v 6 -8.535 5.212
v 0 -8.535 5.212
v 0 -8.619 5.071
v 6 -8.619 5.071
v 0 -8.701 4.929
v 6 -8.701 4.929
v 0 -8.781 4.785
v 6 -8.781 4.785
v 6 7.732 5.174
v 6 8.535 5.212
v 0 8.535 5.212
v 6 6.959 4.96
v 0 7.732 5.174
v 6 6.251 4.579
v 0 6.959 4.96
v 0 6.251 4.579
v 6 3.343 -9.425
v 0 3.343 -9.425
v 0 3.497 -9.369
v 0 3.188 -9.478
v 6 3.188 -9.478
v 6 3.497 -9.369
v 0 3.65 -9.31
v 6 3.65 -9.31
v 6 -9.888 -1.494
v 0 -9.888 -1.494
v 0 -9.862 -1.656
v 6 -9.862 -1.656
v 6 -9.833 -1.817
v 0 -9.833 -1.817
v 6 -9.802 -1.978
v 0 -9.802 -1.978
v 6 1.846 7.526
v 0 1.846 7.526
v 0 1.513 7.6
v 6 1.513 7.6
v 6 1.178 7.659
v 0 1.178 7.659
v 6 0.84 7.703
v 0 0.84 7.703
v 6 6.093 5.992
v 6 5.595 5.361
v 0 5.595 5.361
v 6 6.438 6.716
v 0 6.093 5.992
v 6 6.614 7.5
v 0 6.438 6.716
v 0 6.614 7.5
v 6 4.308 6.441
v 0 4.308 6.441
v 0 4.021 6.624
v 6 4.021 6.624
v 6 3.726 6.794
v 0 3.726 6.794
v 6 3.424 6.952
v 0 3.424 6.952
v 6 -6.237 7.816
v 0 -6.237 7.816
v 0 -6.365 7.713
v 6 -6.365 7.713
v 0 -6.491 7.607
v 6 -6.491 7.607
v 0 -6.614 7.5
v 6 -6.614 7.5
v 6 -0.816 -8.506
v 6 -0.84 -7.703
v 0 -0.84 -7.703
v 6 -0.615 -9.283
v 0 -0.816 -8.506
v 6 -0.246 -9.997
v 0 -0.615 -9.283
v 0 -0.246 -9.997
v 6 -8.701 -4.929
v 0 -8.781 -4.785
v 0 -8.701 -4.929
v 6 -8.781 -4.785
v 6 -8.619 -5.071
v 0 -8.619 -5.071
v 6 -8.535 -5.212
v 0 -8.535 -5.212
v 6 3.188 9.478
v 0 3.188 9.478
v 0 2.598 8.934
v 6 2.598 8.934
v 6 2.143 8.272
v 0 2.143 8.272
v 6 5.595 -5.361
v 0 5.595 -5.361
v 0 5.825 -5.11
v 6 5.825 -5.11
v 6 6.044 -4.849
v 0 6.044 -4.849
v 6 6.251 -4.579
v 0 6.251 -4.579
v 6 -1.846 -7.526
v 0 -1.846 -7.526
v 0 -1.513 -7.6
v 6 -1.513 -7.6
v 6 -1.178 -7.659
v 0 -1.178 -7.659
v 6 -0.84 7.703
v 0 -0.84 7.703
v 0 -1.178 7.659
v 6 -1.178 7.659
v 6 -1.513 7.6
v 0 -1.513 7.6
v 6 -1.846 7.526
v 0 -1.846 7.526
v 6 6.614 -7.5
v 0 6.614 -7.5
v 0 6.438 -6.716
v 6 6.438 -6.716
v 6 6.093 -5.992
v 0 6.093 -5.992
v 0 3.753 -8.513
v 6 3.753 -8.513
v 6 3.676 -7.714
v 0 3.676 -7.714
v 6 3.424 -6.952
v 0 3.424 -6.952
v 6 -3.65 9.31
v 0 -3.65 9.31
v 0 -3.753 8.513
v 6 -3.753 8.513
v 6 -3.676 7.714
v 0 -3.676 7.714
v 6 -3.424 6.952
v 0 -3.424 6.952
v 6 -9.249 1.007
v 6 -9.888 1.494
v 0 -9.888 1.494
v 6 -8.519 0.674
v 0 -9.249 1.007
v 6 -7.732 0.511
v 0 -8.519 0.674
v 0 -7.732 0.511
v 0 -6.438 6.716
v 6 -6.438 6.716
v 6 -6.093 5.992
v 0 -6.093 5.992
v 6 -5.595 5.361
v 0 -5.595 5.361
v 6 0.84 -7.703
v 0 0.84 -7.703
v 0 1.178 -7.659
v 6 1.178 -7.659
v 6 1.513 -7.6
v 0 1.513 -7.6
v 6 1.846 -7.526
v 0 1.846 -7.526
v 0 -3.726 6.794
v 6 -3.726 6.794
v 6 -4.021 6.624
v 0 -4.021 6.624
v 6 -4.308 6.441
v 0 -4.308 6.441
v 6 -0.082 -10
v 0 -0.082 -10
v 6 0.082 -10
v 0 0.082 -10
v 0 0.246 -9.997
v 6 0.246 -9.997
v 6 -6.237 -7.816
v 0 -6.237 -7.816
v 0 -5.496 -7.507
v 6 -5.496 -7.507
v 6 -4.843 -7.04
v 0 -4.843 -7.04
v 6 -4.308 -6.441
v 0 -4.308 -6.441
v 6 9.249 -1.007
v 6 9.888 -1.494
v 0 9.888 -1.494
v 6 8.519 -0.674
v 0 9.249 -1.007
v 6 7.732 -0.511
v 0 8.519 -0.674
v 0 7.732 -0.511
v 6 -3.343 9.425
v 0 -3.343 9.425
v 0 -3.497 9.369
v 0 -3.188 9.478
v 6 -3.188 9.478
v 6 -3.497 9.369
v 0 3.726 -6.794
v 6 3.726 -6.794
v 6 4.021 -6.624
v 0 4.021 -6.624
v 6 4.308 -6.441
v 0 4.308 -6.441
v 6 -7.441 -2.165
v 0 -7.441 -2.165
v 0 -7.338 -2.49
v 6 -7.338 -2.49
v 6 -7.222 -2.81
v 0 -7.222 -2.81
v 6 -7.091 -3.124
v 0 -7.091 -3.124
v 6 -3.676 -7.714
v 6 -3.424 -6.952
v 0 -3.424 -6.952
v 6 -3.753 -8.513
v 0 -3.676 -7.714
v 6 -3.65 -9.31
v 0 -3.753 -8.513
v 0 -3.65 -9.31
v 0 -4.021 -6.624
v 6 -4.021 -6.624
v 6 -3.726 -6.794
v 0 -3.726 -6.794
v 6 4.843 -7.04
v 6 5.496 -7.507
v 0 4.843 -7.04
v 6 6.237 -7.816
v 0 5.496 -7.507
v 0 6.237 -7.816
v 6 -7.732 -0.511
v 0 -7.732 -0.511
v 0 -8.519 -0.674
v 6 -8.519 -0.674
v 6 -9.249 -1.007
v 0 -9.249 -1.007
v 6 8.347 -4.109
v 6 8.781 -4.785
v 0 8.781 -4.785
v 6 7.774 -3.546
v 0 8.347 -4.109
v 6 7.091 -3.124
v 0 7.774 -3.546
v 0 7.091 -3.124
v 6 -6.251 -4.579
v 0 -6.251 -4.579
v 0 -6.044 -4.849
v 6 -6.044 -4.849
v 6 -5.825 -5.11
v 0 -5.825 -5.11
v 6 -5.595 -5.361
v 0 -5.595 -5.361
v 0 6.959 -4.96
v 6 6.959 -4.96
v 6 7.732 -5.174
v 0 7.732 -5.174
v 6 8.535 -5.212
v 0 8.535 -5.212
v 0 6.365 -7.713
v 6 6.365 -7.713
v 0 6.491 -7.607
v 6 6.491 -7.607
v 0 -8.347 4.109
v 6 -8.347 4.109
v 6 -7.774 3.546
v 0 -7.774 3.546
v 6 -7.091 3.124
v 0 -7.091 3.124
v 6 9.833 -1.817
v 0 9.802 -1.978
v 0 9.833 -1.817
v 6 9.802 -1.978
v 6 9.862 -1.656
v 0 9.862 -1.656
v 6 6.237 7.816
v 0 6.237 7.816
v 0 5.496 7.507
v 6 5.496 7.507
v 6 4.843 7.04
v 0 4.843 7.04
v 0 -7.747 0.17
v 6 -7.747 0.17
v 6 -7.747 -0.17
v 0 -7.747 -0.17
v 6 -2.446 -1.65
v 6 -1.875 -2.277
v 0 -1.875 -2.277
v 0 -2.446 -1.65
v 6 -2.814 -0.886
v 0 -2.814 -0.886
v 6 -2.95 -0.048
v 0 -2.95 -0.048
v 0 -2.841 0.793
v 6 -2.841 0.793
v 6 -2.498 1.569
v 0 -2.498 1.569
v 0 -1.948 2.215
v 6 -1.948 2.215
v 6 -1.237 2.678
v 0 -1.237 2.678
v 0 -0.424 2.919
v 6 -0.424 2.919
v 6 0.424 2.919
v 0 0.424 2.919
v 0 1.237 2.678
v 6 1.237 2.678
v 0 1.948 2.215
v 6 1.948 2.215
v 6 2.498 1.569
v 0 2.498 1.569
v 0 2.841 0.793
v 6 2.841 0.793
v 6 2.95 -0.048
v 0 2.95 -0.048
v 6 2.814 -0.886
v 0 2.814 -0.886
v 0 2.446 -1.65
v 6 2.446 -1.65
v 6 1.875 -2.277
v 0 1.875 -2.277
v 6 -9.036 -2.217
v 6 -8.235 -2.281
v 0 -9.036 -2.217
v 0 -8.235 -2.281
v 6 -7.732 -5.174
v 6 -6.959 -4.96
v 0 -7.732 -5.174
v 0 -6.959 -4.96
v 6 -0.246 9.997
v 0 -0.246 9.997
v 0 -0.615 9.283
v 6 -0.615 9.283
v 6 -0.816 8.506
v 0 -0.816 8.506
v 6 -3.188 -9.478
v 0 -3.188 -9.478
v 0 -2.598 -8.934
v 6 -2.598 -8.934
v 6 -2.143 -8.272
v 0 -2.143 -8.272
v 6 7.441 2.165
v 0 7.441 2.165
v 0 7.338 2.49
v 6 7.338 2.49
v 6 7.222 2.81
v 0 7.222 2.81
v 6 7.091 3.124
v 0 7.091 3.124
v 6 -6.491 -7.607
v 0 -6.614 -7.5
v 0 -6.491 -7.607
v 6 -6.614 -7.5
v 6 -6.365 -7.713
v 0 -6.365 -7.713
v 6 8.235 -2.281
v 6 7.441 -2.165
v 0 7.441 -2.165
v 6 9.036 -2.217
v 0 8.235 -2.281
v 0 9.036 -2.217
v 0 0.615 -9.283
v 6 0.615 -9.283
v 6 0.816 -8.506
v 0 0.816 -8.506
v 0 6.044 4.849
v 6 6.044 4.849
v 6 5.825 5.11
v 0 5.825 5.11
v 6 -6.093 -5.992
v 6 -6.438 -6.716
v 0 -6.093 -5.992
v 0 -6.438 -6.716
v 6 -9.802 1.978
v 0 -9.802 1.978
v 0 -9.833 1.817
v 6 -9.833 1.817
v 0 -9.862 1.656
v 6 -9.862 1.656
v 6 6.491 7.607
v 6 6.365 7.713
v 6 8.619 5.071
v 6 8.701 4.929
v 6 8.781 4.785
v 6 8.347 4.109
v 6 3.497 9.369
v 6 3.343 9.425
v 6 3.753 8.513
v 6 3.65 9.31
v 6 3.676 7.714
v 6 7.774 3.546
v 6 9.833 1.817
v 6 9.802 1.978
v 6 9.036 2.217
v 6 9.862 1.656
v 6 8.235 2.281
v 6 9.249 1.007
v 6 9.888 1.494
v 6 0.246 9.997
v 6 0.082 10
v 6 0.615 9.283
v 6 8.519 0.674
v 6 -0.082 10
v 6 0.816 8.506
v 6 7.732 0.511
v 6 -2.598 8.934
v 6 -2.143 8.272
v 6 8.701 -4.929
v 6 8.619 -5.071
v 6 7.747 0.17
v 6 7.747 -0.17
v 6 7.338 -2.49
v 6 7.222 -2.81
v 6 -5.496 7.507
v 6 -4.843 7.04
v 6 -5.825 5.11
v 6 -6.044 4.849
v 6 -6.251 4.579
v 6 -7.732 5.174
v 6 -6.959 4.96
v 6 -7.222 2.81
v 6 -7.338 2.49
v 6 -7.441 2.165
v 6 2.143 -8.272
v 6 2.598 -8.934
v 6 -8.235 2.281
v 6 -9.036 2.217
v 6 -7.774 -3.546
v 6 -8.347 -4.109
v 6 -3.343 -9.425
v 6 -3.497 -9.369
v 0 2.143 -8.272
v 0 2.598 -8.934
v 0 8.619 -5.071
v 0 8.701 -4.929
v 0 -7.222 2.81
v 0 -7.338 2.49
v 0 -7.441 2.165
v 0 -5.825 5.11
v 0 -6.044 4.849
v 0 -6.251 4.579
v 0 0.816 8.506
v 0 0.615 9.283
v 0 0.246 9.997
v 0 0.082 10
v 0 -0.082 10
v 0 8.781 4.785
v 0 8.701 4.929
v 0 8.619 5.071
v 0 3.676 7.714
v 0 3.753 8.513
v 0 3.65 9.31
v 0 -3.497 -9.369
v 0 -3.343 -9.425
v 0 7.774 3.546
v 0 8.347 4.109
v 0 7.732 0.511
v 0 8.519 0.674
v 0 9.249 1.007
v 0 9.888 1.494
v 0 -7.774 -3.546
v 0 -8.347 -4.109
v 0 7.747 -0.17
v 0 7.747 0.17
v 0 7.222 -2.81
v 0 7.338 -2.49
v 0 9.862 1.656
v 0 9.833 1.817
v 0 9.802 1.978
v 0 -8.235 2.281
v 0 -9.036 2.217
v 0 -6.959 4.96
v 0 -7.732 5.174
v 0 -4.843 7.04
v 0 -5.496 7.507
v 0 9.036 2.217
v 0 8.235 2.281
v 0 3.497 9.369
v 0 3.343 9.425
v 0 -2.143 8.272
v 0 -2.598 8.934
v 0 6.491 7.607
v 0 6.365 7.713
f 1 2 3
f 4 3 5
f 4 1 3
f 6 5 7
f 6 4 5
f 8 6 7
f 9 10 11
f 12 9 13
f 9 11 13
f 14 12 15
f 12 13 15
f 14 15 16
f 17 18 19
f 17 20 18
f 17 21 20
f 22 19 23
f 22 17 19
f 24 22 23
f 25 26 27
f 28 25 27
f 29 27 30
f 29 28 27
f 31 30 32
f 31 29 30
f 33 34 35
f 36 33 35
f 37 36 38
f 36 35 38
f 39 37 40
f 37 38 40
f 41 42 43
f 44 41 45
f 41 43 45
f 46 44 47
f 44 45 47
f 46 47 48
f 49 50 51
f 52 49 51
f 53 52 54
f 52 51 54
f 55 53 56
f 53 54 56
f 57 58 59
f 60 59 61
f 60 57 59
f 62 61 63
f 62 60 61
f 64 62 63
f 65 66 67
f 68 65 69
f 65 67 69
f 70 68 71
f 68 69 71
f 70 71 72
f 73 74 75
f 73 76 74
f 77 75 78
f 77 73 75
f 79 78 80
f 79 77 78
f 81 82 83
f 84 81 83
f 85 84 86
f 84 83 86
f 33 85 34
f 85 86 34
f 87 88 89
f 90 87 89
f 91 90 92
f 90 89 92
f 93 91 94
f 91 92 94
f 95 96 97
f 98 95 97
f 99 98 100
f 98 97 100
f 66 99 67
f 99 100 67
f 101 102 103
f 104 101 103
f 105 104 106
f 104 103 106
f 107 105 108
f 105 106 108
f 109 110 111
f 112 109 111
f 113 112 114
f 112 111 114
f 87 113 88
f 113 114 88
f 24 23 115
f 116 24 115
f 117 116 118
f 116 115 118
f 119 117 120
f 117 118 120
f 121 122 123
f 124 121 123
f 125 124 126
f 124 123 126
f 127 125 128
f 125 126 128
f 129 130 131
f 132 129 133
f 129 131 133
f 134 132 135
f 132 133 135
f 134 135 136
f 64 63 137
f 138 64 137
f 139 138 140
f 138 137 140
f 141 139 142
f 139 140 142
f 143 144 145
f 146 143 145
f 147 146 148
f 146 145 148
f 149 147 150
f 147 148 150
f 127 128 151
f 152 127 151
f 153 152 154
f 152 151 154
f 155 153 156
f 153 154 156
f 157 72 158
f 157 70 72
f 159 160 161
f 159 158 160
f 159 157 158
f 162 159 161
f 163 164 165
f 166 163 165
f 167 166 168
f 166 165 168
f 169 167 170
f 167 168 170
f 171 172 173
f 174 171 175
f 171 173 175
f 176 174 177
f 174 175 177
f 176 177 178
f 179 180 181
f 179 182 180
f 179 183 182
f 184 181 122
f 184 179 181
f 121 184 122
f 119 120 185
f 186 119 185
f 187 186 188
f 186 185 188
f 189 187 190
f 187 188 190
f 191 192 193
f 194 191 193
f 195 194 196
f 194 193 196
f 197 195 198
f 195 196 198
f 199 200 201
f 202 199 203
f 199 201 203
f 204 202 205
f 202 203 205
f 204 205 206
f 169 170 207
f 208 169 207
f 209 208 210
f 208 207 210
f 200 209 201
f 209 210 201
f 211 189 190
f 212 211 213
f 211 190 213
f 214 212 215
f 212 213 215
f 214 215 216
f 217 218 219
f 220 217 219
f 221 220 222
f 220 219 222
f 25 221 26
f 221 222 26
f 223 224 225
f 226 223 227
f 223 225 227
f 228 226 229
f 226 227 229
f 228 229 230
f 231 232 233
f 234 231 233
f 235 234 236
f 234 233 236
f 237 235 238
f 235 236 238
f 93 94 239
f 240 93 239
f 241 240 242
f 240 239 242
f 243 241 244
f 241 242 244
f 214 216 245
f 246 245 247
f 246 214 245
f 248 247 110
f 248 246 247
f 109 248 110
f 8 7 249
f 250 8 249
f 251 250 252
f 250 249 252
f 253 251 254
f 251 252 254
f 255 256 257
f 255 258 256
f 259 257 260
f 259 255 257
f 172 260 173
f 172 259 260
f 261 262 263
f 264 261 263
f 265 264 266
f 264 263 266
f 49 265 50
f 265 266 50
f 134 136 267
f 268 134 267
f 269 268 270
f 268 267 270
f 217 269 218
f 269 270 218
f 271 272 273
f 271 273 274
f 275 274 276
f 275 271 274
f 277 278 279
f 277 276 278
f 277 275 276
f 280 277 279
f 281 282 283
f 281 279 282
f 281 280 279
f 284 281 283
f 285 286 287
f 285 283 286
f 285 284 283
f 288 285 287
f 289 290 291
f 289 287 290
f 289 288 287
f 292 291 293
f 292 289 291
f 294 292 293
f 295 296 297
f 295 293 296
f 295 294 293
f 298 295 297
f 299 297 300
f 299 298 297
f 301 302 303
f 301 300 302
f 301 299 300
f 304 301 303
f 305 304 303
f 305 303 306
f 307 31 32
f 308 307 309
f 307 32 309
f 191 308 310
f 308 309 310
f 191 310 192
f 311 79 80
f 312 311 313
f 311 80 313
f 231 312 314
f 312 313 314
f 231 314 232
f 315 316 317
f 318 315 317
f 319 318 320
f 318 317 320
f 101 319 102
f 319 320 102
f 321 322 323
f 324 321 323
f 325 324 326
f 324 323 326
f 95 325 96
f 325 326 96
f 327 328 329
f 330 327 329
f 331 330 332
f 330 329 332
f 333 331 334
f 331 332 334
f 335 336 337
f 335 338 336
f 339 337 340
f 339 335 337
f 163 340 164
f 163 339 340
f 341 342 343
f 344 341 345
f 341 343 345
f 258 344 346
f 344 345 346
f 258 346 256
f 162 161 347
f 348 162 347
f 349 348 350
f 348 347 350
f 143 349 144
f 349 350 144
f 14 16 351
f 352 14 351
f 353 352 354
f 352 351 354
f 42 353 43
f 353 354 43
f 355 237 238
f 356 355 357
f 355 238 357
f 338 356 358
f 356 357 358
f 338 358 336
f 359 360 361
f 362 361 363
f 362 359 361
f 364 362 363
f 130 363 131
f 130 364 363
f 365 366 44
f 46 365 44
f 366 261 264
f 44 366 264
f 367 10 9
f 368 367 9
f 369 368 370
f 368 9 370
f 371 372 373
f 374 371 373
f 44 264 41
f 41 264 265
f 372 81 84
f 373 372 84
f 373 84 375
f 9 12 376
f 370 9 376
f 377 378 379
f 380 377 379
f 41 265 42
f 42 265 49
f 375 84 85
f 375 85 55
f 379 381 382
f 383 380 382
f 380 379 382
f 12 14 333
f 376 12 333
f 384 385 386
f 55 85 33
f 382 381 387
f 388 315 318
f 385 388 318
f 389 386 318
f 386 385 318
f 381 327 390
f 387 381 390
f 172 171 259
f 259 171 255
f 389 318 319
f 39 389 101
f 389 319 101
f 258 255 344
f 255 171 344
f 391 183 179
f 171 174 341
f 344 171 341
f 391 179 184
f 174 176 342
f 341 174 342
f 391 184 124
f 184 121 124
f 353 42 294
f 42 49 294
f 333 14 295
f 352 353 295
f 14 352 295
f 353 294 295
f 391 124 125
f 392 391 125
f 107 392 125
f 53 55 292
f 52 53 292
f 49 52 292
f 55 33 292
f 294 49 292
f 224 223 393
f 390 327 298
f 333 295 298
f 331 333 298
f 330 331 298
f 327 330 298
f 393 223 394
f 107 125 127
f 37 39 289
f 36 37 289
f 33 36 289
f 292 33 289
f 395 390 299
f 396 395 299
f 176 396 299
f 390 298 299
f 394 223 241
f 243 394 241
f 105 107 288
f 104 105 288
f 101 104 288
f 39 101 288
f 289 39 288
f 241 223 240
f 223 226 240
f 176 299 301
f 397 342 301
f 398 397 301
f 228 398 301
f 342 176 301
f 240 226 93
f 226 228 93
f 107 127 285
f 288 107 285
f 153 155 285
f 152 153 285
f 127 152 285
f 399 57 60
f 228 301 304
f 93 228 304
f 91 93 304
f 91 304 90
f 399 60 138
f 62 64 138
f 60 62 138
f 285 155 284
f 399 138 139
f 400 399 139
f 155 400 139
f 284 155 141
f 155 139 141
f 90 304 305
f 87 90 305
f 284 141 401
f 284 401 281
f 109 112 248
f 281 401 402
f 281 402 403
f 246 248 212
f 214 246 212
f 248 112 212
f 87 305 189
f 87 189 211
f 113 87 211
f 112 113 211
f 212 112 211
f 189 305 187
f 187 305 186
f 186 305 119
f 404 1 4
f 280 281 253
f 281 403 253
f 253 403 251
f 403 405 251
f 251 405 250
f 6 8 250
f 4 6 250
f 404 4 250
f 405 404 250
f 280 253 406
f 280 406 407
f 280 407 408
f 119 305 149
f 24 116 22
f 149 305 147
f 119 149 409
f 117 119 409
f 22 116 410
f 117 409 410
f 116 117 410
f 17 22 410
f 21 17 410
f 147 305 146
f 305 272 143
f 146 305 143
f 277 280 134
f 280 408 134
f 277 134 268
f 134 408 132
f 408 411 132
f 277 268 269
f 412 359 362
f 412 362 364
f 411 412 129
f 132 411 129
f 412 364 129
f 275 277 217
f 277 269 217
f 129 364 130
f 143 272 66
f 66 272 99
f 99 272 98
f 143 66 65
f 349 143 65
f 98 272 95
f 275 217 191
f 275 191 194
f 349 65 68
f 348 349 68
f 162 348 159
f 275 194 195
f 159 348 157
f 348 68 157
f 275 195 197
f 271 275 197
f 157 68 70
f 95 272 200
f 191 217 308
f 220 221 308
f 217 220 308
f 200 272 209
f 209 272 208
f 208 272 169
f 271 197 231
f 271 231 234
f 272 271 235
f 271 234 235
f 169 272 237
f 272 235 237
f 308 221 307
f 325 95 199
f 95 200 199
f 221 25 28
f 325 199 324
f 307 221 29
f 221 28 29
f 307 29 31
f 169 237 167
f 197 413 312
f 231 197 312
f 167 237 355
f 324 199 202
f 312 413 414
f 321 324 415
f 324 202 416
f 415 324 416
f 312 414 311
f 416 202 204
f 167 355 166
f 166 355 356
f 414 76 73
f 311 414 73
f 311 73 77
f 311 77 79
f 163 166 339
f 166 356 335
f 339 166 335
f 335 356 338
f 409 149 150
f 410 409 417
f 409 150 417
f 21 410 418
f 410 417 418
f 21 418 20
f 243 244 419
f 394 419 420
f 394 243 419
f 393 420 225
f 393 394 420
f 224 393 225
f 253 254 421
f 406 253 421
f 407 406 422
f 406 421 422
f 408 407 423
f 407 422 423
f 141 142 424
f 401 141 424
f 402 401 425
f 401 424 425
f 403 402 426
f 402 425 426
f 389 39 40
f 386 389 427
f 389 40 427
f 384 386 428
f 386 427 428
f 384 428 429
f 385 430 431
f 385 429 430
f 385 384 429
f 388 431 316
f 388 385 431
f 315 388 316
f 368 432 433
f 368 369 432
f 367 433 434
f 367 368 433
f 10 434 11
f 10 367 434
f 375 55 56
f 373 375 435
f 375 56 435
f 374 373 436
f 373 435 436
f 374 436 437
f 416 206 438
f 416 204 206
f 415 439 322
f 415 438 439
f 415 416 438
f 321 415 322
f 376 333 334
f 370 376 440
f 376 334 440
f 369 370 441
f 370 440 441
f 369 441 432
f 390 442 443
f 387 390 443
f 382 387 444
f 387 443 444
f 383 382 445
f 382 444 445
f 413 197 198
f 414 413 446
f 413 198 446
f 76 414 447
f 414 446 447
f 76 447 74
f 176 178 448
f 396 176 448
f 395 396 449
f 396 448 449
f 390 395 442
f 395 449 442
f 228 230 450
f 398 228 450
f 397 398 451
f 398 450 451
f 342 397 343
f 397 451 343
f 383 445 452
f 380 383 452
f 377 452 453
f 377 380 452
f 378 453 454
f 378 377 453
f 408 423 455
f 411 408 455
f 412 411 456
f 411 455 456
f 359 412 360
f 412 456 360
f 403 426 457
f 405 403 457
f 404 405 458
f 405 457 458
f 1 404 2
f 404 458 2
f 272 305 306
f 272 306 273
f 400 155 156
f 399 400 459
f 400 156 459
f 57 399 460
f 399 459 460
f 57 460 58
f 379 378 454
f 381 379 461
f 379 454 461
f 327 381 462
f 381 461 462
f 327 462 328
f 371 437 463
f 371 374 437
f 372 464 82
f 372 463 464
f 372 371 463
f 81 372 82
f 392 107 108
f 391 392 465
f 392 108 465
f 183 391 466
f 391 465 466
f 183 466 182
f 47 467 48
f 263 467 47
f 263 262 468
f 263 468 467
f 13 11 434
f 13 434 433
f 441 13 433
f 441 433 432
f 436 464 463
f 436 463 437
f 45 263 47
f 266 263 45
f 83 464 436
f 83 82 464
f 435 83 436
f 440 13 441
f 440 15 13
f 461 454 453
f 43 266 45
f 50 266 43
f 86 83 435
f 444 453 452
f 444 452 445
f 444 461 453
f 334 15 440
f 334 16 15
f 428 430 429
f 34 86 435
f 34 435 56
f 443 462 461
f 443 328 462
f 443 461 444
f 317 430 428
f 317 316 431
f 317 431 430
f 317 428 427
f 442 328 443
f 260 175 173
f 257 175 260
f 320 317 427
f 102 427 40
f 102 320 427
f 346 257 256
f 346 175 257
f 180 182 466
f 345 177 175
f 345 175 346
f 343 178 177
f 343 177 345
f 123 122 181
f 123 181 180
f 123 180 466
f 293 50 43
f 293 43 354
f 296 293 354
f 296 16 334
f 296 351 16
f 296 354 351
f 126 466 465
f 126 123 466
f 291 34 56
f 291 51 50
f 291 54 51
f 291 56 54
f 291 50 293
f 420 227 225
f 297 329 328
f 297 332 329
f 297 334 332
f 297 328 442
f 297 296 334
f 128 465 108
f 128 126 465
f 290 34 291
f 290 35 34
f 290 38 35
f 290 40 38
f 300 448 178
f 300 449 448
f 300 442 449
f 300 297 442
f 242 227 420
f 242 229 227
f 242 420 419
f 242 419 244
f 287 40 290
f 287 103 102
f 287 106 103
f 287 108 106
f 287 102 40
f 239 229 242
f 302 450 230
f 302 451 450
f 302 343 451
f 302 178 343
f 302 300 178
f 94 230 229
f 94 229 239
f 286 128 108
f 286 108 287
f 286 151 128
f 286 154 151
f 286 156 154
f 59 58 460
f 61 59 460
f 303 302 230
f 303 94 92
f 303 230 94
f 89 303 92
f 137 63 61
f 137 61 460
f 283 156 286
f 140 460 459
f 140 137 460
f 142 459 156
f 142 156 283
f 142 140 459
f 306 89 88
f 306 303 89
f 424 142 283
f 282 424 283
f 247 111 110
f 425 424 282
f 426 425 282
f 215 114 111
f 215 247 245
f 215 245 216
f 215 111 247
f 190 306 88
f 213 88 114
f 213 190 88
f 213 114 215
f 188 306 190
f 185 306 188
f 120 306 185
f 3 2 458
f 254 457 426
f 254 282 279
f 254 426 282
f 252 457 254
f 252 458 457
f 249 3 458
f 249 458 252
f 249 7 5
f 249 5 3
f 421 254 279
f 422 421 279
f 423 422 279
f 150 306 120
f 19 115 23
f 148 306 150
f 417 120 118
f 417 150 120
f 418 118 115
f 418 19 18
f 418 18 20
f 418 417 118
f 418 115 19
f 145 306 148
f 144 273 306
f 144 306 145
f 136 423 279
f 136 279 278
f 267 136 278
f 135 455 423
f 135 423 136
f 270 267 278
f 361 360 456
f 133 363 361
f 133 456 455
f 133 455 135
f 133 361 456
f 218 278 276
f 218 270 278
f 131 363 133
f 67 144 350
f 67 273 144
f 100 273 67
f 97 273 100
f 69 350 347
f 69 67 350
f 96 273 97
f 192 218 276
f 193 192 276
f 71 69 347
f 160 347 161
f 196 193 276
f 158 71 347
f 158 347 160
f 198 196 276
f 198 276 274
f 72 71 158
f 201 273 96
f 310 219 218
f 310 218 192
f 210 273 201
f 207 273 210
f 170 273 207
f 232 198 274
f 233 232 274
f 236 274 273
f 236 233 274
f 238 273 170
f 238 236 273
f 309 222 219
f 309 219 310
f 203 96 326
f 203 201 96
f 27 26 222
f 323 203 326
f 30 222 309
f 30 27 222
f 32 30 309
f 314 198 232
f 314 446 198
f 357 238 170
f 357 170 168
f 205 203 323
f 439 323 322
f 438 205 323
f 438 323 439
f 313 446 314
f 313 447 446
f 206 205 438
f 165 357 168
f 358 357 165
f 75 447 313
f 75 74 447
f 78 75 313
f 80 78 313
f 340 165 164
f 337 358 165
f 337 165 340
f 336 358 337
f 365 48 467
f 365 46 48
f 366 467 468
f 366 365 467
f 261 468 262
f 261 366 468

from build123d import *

# Parameters (mm, degrees)
BASPROSKE_W        = 6
BASPROSKE_H        = 10
TOOTHCUT_DEPTH     = 16.362291496
TEETHCUTS_COUNT    = 18
TEETHCUTS_ANGLE    = 340
CUT_EXTRUDE1_DEPTH = 16.289512146


with BuildPart() as part:
    # BasProSke → Base-Revolve (revolve)
    with BuildSketch(Plane(origin=(0, 0, 0), x_dir=(1, 0, 0), z_dir=(0, 1, 0)), mode=Mode.PRIVATE) as base_revolve_sk:
        with Locations((3, 5)):
            Rectangle(BASPROSKE_W, BASPROSKE_H)
    revolve(base_revolve_sk.sketch.rotate(Axis((-10, 0, 0), (1, 0, 0)), 180), axis=Axis((-10, 0, 0), (1, 0, 0)))

    # TooCutSke → ToothCut (cut, through all)
    with BuildSketch(Plane(origin=(0, 0, 0), x_dir=(0, 0, -1), z_dir=(1, 0, 0))):
        with BuildLine():
            ThreePointArc((0.510641536, 7.732156635), (0, 7.749), (-0.510641536, 7.732156635))
            ThreePointArc((-0.510641536, 7.732156635), (-0.82619259, 8.907320741), (-1.515208602, 9.910236529))
            ThreePointArc((-1.515208602, 9.910236529), (0, 10.0254), (1.515208602, 9.910236529))
            ThreePointArc((1.515208602, 9.910236529), (0.82619259, 8.907320741), (0.510641536, 7.732156635))
        make_face()
    toothcut = extrude(amount=TOOTHCUT_DEPTH, mode=Mode.SUBTRACT)

    # TeethCuts: ToothCut ×18 about axis
    teethcuts_axis = Axis((-10, 0, 0), (1, 0, 0))
    for i in range(1, TEETHCUTS_COUNT):
        add(toothcut.rotate(teethcuts_axis, i * TEETHCUTS_ANGLE / (TEETHCUTS_COUNT - 1)), mode=Mode.SUBTRACT)

    # Sketch1 → Cut-Extrude1 (cut, through all)
    with BuildSketch(Plane(origin=(6, 0, 0), x_dir=(0, 0, -1), z_dir=(1, 0, 0))):
        with BuildLine():
            Line((2.277471185, 1.875), (2.277471185, -1.875))
            ThreePointArc((2.277471185, -1.875), (-2.95, 0), (2.277471185, 1.875))
        make_face()
    extrude(amount=-CUT_EXTRUDE1_DEPTH, mode=Mode.SUBTRACT)


solid = part.part
